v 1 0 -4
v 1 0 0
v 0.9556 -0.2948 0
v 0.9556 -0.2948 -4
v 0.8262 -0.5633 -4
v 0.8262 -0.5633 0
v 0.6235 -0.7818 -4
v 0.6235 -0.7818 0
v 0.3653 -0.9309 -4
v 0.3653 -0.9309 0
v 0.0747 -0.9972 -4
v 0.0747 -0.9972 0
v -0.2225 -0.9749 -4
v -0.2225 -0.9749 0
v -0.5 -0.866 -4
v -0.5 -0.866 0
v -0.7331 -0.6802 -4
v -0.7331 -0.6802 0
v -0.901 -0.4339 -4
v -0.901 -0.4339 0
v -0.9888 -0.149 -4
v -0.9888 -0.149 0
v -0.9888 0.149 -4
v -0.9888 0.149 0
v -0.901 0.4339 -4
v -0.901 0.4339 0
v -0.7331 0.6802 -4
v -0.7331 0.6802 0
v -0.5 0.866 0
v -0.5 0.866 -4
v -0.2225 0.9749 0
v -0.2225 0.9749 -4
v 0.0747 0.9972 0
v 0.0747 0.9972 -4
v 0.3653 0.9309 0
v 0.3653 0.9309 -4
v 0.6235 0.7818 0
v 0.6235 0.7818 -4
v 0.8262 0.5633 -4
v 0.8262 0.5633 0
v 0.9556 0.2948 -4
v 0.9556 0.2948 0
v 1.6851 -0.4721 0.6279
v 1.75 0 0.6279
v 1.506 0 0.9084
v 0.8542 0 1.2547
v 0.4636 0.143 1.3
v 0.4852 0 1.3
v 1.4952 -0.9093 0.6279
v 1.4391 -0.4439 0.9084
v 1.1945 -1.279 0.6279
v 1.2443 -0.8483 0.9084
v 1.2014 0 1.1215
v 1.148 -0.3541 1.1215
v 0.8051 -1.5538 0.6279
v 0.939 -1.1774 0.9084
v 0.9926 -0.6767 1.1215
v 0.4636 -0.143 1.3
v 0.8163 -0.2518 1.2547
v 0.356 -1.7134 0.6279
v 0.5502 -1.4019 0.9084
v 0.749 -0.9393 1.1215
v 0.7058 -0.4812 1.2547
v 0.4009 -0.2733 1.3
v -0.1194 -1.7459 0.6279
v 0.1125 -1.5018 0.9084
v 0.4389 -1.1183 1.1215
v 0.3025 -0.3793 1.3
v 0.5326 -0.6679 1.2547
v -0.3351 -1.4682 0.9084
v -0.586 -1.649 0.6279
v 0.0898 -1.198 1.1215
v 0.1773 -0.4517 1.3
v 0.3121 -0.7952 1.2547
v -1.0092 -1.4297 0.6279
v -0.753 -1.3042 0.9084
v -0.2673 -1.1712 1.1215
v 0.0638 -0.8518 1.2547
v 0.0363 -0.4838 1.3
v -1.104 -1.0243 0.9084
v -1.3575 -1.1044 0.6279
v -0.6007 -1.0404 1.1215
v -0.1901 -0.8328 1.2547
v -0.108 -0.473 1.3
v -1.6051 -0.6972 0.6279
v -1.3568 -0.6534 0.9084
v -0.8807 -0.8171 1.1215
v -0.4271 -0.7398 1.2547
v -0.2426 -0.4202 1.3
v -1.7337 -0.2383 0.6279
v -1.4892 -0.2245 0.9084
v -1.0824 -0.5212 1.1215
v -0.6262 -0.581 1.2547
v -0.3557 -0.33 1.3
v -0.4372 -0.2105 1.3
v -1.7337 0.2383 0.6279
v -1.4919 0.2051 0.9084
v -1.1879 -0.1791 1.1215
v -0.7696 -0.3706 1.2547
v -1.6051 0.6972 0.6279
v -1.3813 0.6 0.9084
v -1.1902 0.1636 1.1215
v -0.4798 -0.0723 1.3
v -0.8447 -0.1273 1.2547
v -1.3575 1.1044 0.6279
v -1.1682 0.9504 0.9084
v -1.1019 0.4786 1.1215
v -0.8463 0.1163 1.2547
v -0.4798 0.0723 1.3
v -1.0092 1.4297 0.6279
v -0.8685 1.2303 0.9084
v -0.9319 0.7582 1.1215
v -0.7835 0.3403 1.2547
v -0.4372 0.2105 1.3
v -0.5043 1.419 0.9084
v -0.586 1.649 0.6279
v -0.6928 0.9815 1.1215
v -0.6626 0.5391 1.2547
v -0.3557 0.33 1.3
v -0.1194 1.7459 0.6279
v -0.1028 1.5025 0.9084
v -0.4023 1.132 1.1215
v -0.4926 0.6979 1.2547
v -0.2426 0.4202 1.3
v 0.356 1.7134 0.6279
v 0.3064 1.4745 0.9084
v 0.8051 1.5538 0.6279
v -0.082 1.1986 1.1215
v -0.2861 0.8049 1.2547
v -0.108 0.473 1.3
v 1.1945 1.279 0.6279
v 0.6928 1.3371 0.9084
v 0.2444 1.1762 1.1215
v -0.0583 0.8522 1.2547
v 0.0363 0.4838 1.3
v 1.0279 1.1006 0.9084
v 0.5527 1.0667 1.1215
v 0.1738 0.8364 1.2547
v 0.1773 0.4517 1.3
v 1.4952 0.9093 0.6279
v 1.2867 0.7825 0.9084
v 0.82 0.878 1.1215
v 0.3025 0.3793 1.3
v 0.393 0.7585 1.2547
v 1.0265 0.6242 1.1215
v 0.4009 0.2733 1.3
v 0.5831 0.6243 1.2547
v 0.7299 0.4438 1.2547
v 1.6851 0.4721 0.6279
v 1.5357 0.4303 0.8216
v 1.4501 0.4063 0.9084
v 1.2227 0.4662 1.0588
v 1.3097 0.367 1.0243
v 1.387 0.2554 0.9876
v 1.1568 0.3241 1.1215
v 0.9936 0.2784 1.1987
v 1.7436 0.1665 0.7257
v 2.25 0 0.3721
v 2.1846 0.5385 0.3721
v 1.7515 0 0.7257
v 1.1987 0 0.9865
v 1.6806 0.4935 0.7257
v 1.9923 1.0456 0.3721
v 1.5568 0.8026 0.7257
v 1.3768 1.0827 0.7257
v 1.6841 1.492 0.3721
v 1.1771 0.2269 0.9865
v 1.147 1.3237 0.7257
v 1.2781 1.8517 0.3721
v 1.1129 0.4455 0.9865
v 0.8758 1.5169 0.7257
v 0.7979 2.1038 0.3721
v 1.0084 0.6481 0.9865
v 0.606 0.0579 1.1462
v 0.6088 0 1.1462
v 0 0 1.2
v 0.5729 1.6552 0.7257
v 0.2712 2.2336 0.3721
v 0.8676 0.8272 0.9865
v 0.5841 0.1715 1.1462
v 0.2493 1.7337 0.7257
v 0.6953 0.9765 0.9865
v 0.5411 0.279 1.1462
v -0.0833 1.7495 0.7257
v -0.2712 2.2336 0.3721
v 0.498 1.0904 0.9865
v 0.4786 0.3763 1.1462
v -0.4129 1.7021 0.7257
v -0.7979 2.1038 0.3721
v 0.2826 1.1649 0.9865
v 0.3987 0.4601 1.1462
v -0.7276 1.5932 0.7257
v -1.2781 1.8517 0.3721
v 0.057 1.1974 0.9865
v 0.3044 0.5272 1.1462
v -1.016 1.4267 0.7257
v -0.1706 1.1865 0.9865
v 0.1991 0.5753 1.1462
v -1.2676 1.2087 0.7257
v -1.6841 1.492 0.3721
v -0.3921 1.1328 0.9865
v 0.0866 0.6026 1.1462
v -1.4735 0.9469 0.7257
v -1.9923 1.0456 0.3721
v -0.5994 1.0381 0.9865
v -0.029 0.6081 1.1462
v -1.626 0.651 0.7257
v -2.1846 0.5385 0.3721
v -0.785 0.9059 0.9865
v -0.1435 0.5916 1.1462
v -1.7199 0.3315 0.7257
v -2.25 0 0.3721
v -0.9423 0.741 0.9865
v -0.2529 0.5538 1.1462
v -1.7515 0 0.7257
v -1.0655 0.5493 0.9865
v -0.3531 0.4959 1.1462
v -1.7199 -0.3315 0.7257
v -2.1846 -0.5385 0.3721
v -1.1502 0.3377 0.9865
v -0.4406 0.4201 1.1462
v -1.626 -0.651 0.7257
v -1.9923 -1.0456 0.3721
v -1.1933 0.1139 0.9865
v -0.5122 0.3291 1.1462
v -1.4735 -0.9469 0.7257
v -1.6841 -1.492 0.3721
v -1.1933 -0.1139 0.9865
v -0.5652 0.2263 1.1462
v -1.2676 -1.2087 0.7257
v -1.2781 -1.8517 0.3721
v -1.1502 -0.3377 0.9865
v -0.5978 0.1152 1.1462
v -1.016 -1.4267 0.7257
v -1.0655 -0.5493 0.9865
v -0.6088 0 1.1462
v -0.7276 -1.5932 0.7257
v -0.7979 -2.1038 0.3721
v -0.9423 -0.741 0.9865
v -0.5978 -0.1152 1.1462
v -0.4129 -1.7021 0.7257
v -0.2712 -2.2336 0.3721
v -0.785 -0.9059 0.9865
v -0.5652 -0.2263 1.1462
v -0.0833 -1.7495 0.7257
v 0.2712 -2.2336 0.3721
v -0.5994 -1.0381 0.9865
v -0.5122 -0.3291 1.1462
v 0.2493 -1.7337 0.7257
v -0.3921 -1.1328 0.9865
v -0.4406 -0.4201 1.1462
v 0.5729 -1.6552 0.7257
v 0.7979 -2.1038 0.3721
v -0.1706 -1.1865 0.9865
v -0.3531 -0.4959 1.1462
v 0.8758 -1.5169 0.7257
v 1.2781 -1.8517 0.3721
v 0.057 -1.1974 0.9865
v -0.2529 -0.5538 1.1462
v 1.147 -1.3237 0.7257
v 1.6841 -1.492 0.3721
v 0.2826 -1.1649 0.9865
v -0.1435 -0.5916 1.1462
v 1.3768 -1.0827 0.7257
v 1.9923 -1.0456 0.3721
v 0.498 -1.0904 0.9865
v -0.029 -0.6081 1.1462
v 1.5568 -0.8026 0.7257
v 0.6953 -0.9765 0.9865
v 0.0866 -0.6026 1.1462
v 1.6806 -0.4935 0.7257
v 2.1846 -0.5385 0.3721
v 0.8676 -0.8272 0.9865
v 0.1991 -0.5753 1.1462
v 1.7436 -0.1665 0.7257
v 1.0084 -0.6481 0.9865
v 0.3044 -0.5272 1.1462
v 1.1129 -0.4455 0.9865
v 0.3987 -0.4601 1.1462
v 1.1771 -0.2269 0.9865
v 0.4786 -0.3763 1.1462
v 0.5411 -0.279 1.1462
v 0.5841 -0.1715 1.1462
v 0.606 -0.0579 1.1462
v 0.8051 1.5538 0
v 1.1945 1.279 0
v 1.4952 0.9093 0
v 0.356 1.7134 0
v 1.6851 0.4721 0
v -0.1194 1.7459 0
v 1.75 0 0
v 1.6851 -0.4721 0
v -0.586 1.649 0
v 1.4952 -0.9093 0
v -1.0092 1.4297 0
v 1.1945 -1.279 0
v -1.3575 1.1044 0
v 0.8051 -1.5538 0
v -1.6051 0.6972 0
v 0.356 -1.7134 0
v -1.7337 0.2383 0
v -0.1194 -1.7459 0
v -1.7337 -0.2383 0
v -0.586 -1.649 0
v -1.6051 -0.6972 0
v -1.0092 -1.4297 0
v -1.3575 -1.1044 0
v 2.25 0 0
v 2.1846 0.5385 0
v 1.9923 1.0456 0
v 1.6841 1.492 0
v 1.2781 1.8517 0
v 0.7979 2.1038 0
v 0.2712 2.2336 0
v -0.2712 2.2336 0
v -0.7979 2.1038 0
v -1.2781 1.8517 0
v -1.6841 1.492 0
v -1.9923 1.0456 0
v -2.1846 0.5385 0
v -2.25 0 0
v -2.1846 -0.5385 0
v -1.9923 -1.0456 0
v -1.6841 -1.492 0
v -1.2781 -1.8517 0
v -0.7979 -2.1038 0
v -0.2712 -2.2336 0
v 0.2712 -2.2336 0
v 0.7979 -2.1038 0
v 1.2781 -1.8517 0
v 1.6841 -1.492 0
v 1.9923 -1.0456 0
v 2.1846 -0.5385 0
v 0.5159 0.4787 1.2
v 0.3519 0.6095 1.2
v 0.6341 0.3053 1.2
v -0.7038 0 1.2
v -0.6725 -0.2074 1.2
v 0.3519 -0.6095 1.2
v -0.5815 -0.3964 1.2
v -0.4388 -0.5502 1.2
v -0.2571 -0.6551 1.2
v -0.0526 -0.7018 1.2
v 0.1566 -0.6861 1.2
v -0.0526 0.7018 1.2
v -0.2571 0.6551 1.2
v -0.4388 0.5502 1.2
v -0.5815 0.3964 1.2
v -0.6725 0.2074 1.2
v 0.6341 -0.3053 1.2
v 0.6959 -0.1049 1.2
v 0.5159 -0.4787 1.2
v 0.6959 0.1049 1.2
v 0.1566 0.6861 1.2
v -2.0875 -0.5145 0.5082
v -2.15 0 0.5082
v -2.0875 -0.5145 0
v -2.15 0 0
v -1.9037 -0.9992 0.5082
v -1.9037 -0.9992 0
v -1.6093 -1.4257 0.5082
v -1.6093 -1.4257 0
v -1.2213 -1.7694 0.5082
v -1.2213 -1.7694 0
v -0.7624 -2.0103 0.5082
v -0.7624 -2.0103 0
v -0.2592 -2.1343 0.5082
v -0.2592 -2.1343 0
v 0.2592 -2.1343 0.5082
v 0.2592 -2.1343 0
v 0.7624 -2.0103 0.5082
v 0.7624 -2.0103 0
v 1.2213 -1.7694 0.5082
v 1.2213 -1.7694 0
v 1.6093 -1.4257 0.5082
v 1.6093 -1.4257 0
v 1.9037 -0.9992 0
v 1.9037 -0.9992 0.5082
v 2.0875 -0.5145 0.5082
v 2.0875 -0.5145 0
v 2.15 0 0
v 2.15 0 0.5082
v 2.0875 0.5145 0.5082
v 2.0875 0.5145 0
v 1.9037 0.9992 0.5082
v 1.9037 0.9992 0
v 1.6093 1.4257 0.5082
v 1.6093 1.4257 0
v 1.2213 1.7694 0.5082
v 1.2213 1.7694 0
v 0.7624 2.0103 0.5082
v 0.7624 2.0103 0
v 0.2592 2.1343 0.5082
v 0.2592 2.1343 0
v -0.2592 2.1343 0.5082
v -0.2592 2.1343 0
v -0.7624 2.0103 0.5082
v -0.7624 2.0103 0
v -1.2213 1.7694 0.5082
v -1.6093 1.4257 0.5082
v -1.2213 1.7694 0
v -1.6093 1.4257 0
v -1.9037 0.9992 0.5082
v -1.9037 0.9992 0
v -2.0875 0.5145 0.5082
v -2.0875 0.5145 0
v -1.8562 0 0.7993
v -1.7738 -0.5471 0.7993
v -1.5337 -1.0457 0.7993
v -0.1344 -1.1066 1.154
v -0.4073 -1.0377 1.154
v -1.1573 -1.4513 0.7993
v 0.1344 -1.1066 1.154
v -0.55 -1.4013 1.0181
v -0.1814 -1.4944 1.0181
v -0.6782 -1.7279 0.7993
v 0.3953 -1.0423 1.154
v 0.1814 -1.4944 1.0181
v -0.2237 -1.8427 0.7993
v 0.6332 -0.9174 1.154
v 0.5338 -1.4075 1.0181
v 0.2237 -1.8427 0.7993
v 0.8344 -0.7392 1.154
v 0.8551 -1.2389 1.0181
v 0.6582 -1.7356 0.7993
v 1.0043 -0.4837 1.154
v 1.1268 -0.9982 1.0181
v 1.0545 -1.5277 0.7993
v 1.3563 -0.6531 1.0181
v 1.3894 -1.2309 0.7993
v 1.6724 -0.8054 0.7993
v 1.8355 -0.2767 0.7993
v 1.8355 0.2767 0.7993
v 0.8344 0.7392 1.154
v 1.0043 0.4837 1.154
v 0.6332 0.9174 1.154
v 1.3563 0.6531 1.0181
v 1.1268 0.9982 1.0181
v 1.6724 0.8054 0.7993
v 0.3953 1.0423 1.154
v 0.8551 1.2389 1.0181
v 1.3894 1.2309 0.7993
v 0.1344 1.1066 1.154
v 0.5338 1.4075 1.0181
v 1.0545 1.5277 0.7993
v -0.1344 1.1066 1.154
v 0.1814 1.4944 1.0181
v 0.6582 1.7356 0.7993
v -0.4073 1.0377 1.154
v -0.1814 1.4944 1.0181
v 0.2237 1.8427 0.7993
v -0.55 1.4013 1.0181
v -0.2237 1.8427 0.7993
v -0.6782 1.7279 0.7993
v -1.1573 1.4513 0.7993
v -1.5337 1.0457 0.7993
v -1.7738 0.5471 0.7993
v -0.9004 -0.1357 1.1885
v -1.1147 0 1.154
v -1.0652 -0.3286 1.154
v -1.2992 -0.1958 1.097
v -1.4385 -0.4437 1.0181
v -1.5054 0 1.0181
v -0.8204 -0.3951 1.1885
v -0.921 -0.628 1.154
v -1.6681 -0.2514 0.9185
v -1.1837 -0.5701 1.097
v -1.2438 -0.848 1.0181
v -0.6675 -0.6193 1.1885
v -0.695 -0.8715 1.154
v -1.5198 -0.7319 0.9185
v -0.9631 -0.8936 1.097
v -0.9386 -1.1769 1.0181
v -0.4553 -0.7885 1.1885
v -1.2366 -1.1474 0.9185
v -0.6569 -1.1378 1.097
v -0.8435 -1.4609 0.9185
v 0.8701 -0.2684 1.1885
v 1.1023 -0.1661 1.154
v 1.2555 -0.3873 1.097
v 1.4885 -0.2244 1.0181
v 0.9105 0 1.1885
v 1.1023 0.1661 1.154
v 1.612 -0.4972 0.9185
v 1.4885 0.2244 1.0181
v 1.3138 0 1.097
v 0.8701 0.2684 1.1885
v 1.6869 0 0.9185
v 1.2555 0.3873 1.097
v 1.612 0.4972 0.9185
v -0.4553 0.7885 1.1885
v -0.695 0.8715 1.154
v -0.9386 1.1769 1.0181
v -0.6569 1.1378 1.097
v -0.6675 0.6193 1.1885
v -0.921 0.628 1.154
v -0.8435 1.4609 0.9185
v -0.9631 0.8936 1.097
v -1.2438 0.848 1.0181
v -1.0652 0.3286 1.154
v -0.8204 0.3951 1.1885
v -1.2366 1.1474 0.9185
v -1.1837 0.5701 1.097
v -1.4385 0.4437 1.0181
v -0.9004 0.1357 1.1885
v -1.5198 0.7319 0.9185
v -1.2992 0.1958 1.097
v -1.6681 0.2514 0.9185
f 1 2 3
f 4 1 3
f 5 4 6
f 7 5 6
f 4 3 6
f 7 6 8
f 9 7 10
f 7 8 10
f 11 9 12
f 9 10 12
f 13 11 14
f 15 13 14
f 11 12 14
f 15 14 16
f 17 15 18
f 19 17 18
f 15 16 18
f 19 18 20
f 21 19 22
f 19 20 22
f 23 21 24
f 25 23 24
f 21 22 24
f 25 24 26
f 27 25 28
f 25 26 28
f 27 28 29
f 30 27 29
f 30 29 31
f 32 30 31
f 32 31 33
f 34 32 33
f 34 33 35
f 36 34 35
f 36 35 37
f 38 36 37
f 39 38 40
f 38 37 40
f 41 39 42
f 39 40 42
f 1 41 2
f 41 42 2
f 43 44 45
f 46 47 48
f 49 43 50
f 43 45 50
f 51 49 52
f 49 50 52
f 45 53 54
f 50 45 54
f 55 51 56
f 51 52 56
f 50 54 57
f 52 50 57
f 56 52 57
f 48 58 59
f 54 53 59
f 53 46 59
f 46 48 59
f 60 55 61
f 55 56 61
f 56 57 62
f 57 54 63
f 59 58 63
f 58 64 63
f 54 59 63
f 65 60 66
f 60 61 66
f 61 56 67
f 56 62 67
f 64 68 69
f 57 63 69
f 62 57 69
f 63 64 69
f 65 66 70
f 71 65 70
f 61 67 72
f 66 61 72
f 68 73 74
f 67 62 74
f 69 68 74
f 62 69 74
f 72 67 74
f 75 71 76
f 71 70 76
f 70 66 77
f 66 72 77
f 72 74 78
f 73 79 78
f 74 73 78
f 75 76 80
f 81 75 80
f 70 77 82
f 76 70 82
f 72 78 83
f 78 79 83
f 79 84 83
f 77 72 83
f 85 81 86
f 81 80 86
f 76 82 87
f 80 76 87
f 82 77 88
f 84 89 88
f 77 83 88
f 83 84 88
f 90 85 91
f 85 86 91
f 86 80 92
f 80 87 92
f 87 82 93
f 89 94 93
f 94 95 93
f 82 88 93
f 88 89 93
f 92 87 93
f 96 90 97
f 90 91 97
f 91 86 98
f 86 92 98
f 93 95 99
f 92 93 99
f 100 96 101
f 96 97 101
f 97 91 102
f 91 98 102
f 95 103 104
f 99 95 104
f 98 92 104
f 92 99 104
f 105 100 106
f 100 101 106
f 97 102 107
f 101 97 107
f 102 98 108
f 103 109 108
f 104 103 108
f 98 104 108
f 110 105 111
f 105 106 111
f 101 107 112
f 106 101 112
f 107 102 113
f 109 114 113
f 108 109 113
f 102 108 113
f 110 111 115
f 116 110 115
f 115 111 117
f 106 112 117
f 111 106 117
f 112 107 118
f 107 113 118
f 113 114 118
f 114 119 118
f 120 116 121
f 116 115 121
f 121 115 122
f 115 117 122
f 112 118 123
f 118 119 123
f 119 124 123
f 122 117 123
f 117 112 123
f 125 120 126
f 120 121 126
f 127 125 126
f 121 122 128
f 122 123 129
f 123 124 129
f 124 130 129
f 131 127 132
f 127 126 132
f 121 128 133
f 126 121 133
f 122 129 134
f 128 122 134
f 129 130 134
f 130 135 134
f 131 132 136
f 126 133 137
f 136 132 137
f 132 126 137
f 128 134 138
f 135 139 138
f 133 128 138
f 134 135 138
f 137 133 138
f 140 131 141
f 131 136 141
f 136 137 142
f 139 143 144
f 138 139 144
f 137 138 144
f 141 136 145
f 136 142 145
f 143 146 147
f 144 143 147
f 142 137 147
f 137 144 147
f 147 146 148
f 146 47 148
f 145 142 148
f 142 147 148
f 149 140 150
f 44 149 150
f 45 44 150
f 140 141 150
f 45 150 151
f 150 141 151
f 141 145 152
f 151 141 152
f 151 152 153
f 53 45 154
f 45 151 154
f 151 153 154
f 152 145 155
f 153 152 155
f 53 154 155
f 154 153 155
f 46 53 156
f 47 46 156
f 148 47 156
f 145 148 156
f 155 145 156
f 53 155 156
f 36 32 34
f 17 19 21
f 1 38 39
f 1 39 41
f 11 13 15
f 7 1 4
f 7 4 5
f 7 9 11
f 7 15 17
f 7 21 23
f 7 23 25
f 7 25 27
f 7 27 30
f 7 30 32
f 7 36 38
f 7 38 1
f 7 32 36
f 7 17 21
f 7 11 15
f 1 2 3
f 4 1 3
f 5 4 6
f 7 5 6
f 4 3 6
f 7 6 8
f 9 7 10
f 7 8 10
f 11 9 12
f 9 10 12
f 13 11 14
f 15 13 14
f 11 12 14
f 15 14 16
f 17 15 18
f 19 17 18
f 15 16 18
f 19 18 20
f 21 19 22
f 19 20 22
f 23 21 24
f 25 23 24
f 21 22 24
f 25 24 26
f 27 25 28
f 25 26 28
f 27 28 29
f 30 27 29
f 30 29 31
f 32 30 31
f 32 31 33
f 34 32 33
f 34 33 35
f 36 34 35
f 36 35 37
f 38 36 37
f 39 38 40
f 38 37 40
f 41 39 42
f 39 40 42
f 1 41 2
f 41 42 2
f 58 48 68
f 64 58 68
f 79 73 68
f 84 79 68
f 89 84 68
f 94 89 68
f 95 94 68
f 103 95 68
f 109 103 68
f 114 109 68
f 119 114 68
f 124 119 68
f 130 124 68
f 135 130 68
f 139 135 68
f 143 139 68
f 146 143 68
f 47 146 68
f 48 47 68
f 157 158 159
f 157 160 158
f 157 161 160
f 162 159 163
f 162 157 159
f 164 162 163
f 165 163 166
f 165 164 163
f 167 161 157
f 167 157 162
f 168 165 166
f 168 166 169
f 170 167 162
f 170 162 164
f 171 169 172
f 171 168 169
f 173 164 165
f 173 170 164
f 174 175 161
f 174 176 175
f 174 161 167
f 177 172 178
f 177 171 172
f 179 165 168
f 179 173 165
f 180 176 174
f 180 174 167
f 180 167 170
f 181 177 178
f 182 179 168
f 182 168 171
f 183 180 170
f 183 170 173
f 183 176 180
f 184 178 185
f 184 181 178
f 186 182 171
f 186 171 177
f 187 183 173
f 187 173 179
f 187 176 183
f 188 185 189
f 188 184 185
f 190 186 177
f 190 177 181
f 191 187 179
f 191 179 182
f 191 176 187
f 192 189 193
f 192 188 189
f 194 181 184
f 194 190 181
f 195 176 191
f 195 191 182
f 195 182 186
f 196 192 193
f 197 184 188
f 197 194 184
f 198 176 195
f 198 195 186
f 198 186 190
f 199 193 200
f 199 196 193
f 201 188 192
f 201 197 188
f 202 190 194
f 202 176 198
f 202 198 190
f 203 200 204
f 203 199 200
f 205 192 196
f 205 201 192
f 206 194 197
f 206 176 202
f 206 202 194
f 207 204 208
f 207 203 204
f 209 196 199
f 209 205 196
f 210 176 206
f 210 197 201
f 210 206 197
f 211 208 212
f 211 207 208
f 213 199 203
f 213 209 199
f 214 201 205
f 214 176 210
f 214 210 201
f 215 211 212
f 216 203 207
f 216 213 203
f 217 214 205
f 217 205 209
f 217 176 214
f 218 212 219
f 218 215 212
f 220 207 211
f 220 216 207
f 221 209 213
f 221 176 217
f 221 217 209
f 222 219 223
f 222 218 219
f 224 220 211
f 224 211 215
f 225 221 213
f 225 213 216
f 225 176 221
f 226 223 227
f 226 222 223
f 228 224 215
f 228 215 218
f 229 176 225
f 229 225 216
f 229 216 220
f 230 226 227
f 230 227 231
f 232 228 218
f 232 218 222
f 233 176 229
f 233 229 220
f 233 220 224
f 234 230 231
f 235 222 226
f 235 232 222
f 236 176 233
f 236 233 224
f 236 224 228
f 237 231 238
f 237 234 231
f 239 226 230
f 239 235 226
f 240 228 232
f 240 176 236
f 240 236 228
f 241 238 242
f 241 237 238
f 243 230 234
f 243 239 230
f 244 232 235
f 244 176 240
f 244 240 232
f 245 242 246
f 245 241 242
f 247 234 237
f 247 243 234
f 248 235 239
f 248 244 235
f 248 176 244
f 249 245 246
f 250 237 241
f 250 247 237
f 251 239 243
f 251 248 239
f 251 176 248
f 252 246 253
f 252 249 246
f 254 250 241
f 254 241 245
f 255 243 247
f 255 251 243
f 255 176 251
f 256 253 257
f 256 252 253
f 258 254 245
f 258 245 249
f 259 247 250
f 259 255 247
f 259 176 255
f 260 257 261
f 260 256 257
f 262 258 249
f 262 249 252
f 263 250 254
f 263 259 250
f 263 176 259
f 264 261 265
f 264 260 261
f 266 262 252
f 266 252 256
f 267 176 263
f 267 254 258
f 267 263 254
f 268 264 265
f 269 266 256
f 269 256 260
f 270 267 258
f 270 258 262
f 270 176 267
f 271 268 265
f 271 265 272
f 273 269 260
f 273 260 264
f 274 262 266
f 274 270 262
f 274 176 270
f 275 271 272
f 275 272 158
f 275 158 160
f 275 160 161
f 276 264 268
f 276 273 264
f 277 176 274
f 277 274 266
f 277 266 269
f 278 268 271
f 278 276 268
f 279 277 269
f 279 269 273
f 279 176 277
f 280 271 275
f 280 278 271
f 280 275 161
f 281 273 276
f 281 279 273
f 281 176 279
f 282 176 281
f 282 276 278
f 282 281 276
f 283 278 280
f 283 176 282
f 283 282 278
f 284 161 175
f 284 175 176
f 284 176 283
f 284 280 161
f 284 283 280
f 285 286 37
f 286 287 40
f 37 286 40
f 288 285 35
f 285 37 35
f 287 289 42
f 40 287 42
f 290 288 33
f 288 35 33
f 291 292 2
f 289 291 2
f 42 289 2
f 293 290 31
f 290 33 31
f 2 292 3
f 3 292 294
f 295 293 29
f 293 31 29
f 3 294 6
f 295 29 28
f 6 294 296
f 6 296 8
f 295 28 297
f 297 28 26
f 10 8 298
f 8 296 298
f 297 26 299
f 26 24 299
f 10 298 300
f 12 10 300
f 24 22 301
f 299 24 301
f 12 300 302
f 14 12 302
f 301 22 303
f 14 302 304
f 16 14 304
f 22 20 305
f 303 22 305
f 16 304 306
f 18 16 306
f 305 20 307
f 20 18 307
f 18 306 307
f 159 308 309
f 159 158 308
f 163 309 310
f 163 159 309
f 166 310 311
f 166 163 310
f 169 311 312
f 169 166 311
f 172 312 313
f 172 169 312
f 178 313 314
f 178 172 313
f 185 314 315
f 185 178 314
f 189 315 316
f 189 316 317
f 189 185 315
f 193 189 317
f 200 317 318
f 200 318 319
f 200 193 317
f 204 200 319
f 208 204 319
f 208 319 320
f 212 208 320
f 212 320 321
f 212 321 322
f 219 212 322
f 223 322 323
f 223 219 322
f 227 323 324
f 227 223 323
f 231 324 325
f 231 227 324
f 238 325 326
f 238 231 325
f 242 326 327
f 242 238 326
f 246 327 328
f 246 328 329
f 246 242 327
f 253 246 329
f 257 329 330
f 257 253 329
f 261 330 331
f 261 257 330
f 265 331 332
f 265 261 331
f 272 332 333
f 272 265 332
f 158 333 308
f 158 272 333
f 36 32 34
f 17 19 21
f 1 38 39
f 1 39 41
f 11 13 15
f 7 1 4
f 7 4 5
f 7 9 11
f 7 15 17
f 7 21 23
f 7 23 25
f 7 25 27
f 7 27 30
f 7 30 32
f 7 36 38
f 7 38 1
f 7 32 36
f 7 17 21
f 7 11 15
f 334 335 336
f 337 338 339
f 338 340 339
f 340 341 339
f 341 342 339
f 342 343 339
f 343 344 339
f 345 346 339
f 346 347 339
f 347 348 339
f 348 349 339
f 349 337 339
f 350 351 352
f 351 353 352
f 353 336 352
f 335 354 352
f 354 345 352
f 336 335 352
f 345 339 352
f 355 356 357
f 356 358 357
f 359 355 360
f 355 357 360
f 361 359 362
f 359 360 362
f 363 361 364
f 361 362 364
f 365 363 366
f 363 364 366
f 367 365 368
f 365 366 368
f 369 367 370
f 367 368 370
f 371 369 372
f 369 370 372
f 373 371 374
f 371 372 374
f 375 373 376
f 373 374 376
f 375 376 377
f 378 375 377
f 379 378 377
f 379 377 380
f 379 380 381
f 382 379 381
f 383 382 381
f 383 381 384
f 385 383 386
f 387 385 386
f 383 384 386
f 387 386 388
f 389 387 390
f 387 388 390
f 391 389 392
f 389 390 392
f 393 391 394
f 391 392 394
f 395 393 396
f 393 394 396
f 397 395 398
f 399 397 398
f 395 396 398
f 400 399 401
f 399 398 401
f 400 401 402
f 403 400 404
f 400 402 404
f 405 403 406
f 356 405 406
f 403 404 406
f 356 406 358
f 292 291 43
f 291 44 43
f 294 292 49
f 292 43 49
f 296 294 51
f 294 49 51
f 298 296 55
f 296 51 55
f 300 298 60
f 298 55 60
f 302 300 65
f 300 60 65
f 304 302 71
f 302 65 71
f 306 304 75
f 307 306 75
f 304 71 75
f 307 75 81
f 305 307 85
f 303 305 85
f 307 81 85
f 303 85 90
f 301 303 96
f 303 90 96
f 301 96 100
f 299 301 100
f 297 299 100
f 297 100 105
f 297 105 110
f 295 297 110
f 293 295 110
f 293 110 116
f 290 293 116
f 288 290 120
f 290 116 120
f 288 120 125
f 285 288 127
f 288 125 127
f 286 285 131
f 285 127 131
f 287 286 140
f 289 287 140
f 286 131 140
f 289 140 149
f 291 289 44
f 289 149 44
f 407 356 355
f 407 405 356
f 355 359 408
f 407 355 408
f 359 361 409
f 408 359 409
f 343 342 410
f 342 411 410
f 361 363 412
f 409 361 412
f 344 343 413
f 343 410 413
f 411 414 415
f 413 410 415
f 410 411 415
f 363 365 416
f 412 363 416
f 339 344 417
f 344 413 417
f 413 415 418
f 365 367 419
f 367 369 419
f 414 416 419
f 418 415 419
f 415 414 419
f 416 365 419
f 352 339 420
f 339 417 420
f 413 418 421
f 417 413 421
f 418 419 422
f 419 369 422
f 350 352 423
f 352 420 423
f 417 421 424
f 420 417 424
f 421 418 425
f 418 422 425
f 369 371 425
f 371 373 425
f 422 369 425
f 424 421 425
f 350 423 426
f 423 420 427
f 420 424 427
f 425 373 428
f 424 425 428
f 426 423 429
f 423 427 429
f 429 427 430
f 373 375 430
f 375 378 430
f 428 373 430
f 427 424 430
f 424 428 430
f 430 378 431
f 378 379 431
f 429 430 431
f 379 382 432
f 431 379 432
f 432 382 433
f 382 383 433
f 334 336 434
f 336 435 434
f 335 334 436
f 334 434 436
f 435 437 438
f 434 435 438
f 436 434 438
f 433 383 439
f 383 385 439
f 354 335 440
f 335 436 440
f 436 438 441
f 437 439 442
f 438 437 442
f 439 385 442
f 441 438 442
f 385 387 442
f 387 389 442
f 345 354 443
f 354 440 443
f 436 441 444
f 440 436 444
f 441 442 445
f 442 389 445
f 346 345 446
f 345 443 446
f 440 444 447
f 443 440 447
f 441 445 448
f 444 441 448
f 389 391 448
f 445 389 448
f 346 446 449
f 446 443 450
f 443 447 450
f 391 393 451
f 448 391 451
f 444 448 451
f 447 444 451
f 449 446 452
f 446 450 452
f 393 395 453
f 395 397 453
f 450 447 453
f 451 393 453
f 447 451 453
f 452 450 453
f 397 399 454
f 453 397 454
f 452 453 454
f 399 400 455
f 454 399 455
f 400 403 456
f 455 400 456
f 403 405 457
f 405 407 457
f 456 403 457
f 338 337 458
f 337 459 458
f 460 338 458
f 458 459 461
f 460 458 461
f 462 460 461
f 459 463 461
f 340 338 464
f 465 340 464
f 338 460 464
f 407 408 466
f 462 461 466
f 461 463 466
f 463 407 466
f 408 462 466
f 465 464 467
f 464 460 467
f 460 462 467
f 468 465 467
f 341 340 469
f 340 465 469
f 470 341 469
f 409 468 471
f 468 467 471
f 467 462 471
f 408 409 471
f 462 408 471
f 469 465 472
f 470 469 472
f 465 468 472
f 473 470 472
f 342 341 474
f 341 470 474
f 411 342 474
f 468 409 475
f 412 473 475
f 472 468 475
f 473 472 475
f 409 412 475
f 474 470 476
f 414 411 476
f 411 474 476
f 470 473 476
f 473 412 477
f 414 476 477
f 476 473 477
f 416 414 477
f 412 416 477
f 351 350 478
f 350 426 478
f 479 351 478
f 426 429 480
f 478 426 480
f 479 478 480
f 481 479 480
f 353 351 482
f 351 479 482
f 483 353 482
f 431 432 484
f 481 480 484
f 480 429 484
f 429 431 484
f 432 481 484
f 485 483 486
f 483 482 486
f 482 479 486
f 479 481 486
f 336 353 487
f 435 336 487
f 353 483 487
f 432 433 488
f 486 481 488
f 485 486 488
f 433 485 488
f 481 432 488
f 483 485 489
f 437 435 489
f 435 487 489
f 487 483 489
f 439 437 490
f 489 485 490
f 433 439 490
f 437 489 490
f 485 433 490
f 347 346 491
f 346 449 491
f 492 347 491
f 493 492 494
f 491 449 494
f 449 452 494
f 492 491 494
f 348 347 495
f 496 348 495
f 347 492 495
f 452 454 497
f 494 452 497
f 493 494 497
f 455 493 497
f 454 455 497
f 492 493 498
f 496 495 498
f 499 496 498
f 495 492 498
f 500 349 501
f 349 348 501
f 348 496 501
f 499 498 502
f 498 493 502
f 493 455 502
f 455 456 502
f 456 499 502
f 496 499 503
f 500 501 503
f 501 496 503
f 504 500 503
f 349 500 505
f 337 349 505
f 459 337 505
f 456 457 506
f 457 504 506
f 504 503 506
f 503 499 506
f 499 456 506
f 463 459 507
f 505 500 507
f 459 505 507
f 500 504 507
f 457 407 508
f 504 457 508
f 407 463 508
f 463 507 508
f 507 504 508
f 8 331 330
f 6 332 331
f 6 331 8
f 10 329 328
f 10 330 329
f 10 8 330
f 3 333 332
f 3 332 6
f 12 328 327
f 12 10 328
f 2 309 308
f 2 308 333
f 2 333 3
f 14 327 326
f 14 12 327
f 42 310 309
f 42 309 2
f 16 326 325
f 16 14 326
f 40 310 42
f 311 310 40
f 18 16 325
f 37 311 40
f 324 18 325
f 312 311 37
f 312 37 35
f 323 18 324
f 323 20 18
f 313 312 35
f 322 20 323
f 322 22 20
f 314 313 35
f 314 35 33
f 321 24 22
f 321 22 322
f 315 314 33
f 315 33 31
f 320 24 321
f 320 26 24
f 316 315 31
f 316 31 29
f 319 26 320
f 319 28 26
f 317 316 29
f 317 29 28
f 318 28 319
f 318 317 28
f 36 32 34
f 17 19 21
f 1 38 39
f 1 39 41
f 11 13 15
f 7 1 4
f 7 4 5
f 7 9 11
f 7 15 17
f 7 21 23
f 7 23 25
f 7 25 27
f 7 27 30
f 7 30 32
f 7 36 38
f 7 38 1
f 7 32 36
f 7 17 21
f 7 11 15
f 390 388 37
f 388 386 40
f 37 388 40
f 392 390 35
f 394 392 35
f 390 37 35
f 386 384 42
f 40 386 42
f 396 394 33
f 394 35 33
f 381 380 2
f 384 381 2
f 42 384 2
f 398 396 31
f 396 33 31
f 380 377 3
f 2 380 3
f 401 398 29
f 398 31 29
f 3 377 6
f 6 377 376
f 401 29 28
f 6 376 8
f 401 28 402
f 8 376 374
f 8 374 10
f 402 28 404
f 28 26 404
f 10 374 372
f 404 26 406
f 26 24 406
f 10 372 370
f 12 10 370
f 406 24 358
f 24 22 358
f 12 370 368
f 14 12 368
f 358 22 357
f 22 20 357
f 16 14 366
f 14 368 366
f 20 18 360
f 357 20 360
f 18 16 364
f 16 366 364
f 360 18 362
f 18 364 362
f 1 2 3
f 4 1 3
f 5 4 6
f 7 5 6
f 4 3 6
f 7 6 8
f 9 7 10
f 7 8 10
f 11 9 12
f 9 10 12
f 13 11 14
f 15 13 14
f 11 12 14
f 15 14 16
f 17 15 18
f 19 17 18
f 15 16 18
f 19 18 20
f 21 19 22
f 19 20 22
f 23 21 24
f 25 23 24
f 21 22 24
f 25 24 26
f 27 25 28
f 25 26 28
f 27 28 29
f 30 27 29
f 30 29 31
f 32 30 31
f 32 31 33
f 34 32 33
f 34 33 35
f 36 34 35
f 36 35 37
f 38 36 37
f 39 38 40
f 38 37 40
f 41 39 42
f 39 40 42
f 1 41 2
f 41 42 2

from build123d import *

# Parameters (mm, degrees)
F2_R      = 1
F3_DEPTH  = 4
F6_R      = 1
F7_DEPTH  = 4
F10_R     = 1
F11_DEPTH = 4


with BuildPart() as f1:
    # F0 (on Front) → F1 (revolve)
    with BuildSketch(Plane.XZ):
        with BuildLine():
            Line((0, 1.3), (0, 0))
            Line((0, 0), (1.75, 0))
            Line((1.75, 0), (1.75, 0.6278591463))
            ThreePointArc((1.75, 0.6278591463), (1.2013542978, 1.1215289152), (0.4852048587, 1.3))
            Line((0.4852048587, 1.3), (0, 1.3))
        make_face()
    revolve(axis=Axis((0, 0, 0.65), (0, 0, -1)))

    # F2 (on face) → F3 (join)
    with BuildSketch(Plane(origin=(0, 0, 0), x_dir=(1, 0, 0), z_dir=(0, 0, -1))):
        Circle(F2_R)
    extrude(amount=F3_DEPTH)


with BuildPart() as f5:
    # F4 (on Front) → F5 (revolve)
    with BuildSketch(Plane.XZ):
        with BuildLine():
            Line((-2.15, 0), (0, 0))
            Line((0, 0), (0, 1.2))
            Line((0, 1.2), (-0.7037581527, 1.2))
            ThreePointArc((-0.7037581527, 1.2), (-1.5053500961, 1.0181497263), (-2.15, 0.5082029966))
            Line((-2.15, 0.5082029966), (-2.15, 0))
        make_face()
    revolve(axis=Axis((0, 0, 0.6), (0, 0, 1)))

    # F6 (on face) → F7 (join)
    with BuildSketch(Plane(origin=(0, 0, 0), x_dir=(1, 0, 0), z_dir=(0, 0, -1))):
        Circle(F6_R)
    extrude(amount=F7_DEPTH)


with BuildPart() as f9:
    # F8 (on Front) → F9 (revolve)
    with BuildSketch(Plane.XZ):
        with BuildLine():
            Line((2.25, 0), (2.25, 0.3721266112))
            ThreePointArc((2.25, 0.3721266112), (1.1987362458, 0.9864641824), (0, 1.2))
            Line((0, 1.2), (0, 0))
            Line((0, 0), (2.25, 0))
        make_face()
    revolve(axis=Axis((0, 0, 0.6), (0, 0, 1)))

    # F10 (on face) → F11 (join)
    with BuildSketch(Plane(origin=(0, 0, 0), x_dir=(1, 0, 0), z_dir=(0, 0, -1))):
        Circle(F10_R)
    extrude(amount=F11_DEPTH)


solid = Compound([f1.part, f5.part, f9.part])
